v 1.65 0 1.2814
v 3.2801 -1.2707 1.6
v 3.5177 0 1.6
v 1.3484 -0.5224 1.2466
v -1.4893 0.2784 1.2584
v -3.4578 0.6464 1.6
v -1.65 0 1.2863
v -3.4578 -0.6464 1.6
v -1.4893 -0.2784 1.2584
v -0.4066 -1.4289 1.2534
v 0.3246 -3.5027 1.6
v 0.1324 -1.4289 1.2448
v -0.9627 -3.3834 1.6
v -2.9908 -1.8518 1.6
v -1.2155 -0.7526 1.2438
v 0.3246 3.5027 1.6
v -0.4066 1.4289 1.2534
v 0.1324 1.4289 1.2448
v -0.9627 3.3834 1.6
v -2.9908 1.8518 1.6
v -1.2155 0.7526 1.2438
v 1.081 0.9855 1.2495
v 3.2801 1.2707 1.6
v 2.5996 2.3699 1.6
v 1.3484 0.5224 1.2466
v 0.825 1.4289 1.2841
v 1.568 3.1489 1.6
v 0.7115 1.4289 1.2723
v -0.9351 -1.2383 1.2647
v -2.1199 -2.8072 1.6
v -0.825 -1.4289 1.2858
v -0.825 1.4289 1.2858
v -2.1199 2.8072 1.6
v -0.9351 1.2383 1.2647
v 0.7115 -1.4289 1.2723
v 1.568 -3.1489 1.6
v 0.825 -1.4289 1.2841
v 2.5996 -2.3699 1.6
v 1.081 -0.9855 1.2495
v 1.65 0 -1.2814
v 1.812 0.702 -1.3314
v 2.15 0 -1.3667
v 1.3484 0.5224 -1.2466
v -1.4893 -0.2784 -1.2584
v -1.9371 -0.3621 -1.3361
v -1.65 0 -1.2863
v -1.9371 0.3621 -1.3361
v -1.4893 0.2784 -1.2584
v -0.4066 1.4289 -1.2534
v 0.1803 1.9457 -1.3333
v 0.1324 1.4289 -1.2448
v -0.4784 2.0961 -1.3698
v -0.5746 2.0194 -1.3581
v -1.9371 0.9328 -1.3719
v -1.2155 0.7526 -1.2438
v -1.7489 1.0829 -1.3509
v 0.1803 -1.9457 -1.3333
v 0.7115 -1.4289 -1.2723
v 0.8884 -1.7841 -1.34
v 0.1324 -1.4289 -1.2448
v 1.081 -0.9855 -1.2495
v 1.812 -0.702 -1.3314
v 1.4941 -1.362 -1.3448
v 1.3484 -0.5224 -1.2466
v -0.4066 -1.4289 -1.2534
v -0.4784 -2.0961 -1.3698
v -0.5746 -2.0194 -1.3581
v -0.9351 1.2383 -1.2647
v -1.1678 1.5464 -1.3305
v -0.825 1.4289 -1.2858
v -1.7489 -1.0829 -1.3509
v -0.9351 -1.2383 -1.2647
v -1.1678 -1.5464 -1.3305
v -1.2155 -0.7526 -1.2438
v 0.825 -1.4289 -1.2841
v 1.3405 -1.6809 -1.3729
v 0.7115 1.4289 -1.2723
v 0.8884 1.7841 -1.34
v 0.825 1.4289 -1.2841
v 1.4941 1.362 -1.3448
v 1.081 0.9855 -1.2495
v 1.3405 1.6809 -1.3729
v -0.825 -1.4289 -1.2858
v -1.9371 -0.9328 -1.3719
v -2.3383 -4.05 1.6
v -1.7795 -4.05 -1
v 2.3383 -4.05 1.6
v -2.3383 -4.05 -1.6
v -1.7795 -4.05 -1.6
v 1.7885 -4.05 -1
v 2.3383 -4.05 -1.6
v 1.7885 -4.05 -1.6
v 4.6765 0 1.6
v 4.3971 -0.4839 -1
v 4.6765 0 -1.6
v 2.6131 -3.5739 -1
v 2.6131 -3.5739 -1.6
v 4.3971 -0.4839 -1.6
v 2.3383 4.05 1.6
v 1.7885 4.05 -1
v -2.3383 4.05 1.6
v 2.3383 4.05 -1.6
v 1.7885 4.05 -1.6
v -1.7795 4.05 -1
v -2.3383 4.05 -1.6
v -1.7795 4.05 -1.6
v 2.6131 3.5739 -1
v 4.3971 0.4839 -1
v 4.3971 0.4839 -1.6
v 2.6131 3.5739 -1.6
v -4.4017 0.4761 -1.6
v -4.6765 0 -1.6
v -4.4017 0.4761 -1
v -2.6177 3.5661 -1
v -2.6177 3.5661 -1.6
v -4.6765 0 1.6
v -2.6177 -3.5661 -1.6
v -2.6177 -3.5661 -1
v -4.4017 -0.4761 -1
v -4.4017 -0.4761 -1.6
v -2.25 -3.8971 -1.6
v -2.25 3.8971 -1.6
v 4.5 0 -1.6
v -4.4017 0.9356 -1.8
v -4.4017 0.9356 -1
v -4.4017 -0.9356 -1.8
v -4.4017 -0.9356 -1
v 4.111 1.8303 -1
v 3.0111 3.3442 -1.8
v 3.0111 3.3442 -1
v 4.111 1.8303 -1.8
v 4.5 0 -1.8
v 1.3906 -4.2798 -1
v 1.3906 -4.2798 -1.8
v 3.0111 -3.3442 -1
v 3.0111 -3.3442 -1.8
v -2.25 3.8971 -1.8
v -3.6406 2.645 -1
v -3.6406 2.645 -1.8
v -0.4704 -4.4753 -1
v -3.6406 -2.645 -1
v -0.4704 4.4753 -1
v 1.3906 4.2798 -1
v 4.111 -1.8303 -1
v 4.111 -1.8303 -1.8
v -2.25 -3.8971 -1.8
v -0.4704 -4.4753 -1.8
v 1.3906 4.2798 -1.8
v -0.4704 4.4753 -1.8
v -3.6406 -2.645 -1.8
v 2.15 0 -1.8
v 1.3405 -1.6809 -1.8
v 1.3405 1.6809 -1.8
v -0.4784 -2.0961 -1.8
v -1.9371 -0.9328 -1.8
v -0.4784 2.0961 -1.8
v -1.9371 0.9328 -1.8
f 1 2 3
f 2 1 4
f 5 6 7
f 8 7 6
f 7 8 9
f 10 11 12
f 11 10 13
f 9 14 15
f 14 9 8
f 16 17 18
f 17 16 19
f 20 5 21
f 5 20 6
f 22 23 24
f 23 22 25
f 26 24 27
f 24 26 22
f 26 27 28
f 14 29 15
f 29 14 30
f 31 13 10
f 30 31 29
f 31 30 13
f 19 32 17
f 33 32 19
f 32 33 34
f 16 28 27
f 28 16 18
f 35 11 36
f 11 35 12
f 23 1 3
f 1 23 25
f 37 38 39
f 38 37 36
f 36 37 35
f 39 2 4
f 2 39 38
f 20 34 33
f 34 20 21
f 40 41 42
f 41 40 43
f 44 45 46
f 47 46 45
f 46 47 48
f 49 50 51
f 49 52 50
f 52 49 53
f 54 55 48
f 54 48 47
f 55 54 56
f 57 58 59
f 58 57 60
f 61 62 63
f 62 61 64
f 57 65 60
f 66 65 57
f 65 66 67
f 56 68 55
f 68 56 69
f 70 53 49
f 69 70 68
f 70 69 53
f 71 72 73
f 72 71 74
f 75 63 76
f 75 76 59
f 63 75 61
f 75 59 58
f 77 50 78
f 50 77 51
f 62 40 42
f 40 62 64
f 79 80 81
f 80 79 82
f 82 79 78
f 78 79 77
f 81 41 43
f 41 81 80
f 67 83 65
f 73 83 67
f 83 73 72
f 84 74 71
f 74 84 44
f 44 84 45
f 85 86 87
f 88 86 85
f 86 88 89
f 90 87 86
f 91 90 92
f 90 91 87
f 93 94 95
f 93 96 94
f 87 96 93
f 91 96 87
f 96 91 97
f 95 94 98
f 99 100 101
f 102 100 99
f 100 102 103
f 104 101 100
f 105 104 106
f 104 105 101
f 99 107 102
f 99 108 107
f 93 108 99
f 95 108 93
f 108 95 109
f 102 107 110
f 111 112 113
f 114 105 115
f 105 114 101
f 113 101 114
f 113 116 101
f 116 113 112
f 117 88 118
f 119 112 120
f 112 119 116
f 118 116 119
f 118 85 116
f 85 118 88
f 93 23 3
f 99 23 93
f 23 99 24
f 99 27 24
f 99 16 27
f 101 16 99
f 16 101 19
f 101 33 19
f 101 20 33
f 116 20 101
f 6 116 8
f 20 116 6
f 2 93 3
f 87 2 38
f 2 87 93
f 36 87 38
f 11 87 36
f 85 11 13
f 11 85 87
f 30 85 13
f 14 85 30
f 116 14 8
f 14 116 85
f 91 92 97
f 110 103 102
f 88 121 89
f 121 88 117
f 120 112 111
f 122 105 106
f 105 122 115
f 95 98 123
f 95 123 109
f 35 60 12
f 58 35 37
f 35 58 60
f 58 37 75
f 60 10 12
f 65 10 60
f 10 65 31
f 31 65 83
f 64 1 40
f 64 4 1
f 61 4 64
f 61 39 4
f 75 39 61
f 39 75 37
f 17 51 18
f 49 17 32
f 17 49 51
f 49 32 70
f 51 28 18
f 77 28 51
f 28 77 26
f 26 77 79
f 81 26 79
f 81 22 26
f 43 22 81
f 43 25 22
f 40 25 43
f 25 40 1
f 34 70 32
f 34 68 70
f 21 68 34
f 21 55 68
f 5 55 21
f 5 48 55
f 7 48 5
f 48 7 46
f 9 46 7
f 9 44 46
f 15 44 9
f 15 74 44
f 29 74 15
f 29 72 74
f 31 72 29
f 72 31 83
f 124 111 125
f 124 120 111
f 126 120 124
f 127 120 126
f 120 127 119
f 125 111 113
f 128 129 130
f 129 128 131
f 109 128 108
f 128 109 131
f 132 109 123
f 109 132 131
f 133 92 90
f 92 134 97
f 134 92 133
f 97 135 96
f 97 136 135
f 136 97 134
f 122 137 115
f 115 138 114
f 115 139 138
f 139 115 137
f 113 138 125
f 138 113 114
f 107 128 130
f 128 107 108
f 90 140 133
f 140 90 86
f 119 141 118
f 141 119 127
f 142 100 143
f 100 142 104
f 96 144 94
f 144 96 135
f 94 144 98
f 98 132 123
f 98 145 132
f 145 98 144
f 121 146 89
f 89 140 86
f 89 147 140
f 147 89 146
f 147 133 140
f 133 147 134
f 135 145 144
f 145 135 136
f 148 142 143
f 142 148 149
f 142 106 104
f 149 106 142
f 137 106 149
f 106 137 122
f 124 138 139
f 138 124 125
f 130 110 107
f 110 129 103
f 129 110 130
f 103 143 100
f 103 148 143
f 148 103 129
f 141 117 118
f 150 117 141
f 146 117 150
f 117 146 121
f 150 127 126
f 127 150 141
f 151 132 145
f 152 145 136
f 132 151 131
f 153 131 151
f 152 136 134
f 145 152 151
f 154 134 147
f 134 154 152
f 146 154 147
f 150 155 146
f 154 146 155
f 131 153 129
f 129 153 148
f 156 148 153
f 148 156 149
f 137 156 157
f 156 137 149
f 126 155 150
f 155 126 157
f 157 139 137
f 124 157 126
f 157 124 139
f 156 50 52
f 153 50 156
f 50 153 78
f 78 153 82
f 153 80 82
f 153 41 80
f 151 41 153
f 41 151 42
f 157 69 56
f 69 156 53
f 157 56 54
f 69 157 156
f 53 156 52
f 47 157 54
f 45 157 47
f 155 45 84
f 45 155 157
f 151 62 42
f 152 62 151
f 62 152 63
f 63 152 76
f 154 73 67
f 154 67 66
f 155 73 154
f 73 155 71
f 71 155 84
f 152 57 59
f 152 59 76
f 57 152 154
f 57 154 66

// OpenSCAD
// Parameters
thread_diameter_mm = 4.0; //[2.0:8.0:0.1]
across_flats_mm = 8.1; //[4.0:16.2:0.1]
thickness_mm = 3.2; //[1.6:6.4:0.1]
hole_diameter_mm = 3.3; //[2.5:4.5:0.05]
chamfer_mm = 0.3; //[0.0:1.0:0.05]
overlap_mm = 0.6; //[0.2:2.0:0.1]
hex_circumradius_mm = 4.676537180435969; //[2.0:10.0:0.01]
washer_enabled = 1; //[0:1:1]
washer_outer_diameter_mm = 9.0; //[6.0:18.0:0.1]
washer_thickness_mm = 0.8; //[0.4:2.0:0.05]
washer_hole_diameter_mm = 4.3; //[3.6:6.0:0.05]

// M4 Nut - complete geometry
module nut() {
  color("DimGray") {
    difference() {
      // Hex nut body
      cylinder(r=hex_circumradius_mm, h=thickness_mm, center=true, $fn=6);
      // Central thread hole
      translate([0, 0, 0])
        cylinder(r=hole_diameter_mm/2, h=thickness_mm + 2*overlap_mm, center=true);
      // Top and bottom chamfers
      union() {
        translate([0, 0, thickness_mm/2 - (chamfer_mm + overlap_mm)/2 + overlap_mm/2])
          rotate([180, 0, 0])
          cylinder(r1=hex_circumradius_mm + overlap_mm, r2=0, h=chamfer_mm + overlap_mm, center=true);
        translate([0, 0, -thickness_mm/2 + (chamfer_mm + overlap_mm)/2 - overlap_mm/2])
          cylinder(r1=hex_circumradius_mm + overlap_mm, r2=0, h=chamfer_mm + overlap_mm, center=true);
      }
    }
  }
}

// Washer - complete geometry
module washer() {
  if (washer_enabled) {
    color("Silver") {
      difference() {
        // Washer outer
        translate([0, 0, -thickness_mm/2 - washer_thickness_mm/2 + overlap_mm])
          cylinder(r=washer_outer_diameter_mm/2, h=washer_thickness_mm, center=true);
        // Washer inner hole
        translate([0, 0, -thickness_mm/2 - washer_thickness_mm/2 + overlap_mm])
          cylinder(r=washer_hole_diameter_mm/2, h=washer_thickness_mm + 2*overlap_mm, center=true);
      }
    }
  }
}

// Nut and Washer Assembly
module nut_and_washer() {
  union() {
    nut();
    washer();
  }
}

// Final Assembly
module assembly() {
  nut_and_washer();
}

assembly();
